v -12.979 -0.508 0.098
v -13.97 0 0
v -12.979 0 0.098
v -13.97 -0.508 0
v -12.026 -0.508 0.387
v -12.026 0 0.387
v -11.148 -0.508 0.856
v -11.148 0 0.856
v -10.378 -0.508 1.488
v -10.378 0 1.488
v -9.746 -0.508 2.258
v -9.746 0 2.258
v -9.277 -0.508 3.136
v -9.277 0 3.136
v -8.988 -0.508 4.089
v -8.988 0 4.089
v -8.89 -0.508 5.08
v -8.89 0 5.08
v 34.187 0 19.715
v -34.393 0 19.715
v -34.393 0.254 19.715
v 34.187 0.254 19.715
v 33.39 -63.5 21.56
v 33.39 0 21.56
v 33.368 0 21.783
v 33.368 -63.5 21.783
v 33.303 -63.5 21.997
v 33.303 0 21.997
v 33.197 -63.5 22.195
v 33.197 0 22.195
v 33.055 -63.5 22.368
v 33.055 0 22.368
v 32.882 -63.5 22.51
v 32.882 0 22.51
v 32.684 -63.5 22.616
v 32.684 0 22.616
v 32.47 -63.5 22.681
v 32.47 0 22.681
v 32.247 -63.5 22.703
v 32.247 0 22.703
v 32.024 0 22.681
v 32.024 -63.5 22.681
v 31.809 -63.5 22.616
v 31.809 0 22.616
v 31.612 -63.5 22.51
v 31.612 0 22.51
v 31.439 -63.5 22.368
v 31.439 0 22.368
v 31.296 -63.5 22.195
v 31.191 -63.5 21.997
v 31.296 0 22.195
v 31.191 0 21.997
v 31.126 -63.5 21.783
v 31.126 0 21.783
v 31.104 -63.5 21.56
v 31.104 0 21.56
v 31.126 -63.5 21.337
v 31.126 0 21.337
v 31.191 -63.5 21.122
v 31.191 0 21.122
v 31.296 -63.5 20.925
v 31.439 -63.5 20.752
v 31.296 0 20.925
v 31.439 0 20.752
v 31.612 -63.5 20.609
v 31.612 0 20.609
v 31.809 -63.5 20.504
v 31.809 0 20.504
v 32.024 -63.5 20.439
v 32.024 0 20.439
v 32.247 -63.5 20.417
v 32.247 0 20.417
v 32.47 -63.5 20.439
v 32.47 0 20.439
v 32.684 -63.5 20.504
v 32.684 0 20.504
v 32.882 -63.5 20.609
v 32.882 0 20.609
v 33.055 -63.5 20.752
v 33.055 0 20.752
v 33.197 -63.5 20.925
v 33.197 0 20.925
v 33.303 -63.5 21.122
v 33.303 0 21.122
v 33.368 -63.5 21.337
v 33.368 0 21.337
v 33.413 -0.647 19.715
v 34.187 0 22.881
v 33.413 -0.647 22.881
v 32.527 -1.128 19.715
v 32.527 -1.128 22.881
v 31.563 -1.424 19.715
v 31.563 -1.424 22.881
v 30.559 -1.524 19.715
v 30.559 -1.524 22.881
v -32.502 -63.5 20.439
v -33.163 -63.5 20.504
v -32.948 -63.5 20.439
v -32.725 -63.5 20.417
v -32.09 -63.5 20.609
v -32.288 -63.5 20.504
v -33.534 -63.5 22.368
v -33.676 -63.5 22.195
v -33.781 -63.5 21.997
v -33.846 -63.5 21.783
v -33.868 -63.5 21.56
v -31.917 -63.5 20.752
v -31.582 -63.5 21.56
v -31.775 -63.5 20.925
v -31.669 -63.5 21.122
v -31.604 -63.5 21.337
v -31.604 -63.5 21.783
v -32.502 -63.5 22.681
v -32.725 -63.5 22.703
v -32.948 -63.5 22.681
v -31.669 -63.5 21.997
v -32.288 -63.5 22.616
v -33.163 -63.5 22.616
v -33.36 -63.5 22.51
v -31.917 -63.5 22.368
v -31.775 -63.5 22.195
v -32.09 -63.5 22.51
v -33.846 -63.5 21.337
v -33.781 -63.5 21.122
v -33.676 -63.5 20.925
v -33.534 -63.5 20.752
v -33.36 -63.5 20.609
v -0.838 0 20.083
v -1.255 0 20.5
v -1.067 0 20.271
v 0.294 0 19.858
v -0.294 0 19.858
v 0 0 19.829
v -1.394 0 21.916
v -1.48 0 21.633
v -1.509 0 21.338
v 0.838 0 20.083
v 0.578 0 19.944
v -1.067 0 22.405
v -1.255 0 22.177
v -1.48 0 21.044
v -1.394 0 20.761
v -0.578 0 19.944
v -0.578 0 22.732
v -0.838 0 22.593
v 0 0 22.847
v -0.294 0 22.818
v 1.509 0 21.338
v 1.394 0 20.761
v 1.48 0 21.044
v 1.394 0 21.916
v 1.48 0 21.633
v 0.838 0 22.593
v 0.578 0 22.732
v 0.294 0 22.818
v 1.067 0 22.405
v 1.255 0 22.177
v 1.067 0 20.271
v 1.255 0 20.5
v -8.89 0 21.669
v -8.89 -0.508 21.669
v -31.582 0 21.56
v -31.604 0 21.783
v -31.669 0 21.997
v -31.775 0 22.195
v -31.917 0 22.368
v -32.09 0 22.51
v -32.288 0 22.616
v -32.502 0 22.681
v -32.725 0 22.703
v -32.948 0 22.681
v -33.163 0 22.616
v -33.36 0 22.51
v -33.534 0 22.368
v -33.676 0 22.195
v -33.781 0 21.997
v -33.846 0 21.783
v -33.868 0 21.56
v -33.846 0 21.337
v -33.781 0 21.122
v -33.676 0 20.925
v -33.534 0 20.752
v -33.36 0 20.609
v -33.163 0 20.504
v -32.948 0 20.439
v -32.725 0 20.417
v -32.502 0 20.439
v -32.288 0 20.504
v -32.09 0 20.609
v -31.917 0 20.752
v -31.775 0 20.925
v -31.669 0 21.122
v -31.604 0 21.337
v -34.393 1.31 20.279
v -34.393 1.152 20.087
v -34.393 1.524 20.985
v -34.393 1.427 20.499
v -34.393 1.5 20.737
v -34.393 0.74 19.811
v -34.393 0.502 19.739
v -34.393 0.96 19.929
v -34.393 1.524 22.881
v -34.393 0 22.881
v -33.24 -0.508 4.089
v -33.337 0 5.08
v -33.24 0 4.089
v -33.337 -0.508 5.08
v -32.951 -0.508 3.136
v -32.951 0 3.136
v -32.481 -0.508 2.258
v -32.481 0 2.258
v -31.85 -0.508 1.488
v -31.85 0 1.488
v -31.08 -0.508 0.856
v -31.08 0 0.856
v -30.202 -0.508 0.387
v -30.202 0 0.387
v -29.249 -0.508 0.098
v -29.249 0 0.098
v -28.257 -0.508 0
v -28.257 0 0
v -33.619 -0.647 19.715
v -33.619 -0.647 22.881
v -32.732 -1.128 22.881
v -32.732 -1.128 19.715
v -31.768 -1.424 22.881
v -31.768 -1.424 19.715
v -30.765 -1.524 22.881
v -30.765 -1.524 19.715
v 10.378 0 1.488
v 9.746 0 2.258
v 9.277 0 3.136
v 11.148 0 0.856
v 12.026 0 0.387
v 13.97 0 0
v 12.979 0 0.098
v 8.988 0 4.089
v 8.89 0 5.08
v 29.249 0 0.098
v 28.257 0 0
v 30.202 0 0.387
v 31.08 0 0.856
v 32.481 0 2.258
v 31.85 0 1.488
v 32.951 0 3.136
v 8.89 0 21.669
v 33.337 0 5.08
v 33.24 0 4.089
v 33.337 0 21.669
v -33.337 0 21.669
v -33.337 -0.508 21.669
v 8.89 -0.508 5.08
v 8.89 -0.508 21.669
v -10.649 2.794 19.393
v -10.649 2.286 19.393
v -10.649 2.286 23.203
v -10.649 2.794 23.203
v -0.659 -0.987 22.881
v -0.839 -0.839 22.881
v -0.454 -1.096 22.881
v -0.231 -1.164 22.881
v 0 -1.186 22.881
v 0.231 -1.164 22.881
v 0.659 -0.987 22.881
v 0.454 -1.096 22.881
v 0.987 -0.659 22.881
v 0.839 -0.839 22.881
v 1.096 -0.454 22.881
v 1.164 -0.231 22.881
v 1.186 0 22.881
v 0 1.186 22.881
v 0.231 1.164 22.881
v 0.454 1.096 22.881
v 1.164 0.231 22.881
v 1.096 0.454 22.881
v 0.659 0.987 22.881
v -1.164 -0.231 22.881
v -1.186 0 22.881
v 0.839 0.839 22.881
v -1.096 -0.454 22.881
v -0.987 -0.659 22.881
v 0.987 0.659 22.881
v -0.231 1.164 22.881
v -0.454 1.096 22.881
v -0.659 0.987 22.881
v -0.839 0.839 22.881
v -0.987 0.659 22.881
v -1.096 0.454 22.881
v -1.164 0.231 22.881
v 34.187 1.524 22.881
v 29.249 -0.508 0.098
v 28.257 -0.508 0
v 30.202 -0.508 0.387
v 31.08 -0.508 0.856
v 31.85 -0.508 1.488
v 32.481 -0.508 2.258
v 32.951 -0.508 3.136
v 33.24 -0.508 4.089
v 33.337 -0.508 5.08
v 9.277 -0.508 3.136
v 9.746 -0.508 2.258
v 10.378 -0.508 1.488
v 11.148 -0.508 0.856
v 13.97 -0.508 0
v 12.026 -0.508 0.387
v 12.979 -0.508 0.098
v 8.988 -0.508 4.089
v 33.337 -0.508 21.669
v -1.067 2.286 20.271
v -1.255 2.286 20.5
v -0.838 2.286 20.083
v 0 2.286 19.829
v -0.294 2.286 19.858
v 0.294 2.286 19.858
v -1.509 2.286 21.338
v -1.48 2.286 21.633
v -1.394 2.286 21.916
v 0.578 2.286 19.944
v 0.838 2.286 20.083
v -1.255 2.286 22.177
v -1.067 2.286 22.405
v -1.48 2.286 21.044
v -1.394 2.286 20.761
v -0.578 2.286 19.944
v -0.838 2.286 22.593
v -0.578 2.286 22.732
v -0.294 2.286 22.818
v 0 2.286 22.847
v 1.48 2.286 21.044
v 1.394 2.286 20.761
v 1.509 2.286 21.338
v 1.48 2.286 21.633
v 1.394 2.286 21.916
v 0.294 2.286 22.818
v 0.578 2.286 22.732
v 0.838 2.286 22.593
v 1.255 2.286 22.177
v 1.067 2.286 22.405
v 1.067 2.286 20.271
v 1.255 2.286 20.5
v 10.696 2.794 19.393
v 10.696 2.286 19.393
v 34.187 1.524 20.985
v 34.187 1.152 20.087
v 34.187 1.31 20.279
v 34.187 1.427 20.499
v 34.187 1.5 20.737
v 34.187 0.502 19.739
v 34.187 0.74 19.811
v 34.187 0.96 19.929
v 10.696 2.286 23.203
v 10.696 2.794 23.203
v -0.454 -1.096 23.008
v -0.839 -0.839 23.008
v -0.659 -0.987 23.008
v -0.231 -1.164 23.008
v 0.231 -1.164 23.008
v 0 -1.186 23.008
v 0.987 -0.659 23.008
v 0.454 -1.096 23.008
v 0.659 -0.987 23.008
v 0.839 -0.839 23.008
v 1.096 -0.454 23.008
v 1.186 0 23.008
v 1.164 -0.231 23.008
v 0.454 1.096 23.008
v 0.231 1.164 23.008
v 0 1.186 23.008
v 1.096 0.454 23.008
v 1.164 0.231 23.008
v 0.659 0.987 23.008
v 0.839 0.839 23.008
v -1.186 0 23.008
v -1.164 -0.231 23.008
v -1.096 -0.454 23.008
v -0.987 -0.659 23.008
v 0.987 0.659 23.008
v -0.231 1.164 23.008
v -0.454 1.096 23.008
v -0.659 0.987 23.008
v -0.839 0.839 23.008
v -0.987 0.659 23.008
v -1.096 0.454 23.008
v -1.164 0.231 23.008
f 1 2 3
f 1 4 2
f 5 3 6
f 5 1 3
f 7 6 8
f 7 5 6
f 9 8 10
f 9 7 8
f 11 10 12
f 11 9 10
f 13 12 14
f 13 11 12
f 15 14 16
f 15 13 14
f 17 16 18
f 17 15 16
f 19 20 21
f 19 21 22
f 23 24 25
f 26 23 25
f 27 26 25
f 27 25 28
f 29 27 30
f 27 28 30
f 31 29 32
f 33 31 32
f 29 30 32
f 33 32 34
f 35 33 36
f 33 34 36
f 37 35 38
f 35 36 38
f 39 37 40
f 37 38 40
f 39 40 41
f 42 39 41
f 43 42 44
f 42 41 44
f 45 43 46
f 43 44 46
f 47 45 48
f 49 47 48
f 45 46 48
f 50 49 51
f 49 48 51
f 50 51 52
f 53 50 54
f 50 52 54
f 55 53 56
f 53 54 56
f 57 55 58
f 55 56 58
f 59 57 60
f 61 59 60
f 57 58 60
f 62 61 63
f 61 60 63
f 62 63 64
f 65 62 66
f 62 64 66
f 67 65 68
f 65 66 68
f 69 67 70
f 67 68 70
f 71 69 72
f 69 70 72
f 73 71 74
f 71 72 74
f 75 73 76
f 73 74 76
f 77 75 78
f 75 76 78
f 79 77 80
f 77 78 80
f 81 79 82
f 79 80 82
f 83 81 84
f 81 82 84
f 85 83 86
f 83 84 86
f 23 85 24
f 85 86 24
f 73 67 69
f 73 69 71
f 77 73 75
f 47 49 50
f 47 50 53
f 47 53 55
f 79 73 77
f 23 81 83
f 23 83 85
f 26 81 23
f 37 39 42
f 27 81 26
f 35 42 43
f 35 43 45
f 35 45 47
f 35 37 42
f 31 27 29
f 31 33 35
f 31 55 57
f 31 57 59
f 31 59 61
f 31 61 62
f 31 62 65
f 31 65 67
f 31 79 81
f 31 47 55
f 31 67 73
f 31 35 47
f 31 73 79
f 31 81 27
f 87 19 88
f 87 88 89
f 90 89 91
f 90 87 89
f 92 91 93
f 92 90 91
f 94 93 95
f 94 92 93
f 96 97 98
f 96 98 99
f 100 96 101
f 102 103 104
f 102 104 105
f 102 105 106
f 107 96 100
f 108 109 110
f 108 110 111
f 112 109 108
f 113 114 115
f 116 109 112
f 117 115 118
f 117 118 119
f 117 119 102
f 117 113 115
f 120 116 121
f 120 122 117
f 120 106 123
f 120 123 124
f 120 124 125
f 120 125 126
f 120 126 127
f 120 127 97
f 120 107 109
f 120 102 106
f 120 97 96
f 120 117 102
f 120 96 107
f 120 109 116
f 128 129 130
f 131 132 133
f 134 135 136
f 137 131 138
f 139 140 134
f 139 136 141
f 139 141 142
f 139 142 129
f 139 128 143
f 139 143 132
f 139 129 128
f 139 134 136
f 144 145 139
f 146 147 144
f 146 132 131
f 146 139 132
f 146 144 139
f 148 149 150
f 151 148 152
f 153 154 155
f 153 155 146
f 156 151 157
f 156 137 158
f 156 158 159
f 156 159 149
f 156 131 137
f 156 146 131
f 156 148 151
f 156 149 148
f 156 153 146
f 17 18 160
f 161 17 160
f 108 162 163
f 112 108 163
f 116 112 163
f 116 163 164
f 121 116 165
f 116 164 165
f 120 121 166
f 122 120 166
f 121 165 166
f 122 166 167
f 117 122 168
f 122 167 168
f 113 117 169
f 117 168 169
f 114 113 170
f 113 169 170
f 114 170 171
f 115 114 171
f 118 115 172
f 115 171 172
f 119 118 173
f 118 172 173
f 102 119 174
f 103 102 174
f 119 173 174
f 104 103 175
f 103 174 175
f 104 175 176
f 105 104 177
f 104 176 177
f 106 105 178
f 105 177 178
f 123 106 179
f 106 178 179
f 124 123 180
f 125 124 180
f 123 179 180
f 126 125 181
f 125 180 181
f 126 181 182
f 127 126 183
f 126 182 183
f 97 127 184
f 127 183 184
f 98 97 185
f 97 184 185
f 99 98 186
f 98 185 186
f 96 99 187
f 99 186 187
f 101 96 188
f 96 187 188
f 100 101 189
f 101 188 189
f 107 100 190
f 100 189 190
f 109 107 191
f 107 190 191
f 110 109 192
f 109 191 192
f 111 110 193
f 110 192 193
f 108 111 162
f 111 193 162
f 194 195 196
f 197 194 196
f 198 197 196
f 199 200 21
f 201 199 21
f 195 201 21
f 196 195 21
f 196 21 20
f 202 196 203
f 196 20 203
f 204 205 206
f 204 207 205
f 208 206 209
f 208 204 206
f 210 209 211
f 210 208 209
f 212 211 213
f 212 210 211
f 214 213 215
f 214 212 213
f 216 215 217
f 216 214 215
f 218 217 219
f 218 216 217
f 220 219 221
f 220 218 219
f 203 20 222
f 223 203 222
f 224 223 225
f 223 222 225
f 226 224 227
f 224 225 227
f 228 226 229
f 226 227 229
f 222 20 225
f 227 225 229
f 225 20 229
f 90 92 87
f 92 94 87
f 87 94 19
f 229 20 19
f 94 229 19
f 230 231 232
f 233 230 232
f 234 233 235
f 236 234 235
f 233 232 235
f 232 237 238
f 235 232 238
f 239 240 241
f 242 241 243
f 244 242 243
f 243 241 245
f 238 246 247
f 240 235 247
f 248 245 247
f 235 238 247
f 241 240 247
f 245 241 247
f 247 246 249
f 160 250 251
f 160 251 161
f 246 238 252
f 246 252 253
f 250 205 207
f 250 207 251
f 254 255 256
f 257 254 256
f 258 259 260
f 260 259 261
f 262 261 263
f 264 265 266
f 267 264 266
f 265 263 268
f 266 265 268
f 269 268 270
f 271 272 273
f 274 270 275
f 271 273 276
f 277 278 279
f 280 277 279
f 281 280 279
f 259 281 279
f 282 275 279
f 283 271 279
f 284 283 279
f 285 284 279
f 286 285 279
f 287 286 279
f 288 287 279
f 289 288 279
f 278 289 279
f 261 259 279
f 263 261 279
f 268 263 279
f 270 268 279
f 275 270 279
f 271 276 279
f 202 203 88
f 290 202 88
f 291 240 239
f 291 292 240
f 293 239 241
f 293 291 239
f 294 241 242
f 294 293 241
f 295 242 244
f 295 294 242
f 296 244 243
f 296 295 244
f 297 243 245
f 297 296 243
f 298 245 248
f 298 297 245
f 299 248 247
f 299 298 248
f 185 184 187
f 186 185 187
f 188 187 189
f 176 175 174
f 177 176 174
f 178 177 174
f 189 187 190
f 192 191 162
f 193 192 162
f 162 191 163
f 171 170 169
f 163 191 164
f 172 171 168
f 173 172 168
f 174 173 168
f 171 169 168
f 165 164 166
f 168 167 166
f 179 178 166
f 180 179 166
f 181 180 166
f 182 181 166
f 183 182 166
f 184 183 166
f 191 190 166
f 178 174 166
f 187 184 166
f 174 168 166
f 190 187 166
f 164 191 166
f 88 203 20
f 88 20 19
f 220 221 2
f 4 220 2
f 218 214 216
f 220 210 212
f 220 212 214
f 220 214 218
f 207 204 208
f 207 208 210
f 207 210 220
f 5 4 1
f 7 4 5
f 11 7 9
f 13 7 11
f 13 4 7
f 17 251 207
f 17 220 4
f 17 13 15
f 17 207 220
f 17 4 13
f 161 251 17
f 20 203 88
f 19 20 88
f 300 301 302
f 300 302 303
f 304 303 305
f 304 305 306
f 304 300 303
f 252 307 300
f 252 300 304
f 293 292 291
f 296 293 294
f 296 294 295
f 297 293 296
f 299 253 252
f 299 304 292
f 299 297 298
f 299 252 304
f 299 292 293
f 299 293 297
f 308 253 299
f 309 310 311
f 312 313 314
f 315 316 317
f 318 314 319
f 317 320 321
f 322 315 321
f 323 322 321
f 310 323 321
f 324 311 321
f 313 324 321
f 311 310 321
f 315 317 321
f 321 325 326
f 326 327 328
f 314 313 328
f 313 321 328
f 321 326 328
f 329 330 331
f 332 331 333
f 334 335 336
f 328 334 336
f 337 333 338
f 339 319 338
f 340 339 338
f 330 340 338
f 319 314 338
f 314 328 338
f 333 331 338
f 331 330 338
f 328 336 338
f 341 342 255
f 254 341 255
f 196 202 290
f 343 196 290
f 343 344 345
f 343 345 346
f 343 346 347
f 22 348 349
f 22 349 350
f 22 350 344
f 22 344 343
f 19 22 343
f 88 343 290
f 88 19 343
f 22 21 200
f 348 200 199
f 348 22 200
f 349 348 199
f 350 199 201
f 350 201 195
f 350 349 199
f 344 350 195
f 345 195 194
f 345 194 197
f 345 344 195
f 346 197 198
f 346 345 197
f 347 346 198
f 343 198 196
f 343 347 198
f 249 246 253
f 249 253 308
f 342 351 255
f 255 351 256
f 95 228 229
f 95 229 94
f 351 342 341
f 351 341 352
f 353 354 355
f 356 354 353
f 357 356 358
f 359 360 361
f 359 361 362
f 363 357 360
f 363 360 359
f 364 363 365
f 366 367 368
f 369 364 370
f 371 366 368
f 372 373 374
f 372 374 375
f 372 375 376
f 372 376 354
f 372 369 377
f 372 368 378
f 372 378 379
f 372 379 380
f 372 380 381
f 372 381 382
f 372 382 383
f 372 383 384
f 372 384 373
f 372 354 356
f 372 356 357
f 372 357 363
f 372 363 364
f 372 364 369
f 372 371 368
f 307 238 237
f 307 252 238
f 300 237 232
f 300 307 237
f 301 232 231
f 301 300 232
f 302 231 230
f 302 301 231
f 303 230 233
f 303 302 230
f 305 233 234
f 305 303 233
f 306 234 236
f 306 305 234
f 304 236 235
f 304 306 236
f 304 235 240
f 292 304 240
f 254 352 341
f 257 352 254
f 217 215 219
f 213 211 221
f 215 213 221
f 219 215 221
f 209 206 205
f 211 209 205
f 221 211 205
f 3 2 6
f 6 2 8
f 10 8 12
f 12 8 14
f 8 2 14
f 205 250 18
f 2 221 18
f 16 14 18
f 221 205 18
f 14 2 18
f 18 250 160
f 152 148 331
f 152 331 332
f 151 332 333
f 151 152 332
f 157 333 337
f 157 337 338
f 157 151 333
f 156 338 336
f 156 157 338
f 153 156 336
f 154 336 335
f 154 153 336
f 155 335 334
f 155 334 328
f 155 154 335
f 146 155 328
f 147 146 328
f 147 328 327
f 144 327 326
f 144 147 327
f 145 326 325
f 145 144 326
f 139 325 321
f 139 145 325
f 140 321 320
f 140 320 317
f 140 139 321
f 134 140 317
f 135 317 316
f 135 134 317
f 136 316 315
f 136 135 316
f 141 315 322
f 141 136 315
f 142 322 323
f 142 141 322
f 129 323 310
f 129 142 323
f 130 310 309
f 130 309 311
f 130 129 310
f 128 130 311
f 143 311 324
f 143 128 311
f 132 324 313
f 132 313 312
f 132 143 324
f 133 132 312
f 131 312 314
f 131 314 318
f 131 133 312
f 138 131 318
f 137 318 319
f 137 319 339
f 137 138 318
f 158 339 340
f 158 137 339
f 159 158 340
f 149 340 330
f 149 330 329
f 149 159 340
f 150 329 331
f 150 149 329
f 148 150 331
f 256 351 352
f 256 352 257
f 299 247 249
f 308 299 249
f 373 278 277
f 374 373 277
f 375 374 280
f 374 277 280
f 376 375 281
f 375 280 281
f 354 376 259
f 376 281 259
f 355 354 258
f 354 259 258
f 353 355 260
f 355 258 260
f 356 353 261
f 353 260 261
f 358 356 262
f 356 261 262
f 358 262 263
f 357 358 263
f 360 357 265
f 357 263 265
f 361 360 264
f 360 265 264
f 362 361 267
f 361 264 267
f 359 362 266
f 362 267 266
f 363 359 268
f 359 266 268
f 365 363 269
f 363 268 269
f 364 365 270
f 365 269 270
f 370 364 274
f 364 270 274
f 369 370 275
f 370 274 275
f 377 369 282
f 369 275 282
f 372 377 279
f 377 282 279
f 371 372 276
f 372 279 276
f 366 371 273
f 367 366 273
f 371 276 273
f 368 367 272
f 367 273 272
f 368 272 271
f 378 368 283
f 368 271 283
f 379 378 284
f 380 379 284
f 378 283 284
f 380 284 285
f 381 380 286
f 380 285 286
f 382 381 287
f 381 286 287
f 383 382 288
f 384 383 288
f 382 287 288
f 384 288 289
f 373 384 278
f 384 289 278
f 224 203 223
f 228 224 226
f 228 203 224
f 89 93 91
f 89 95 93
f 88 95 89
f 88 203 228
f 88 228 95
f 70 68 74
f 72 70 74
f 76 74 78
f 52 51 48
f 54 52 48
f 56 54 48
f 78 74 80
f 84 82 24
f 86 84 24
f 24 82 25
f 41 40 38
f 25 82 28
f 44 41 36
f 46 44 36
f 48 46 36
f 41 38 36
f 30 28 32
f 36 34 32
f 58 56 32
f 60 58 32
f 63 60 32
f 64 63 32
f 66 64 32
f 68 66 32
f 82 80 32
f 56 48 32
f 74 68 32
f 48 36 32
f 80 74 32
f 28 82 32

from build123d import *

# Parameters (mm, degrees)
F0_W        = 24.4474970783
F0_H        = 21.6693738201
F1_DEPTH    = 0.508
F2_W        = 68.58
F2_H        = 3.1658634543
F3_DEPTH    = 1.524
F4_DEPTH    = 1.524
F5_R        = 5.08
F5_2_R      = 5.08
F6_R        = 1.143
F7_DEPTH    = 63.5
F8_R        = 1.27
F9_T1_DEPTH = 21.3050916628
F10_R       = 1.5092579777
F11_DEPTH   = 2.286
F12_W       = 21.3444312233
F12_H       = 3.81
F12_R       = 1.5092579777
F13_DEPTH   = 0.508
F15_DEPTH   = 0.127


# Not quite as in the source:
# - a fillet or chamfer that OpenCascade refuses, or shapes differently, is made with other operations: its cross-section is extruded or revolved along the edge and cut away or added


with BuildPart() as f1:
    # F0 (on Front) → F1 (new body)
    with BuildSketch(Plane.XZ):
        with Locations((-21.1137485391, 10.83468691)):
            Rectangle(F0_W, F0_H)
    extrude(amount=F1_DEPTH)

    # F5
    f5_edges = [f1.edges().sort_by_distance(p)[0] for p in [
        (-8.89, -0.254, 0),
        (-33.337497, -0.254, 0),
    ]]
    fillet(f5_edges, radius=F5_R)


with BuildPart() as f1b:
    # F0 (on Front) → F1, piece 2 (new body)
    with BuildSketch(Plane.XZ):
        with Locations((21.1137485391, 10.83468691)):
            Rectangle(F0_W, F0_H)
    extrude(amount=F1_DEPTH)

    # F5#2
    f5_2_edges = [f1b.edges().sort_by_distance(p)[0] for p in [
        (8.89, -0.254, 0),
        (33.337497, -0.254, 0),
    ]]
    fillet(f5_2_edges, radius=F5_2_R)


with BuildPart() as f3:
    # F2 (on Front) → F3 (new body)
    with BuildSketch(Plane.XZ):
        with Locations((-0.1027890062, 21.2976261973)):
            Rectangle(F2_W, F2_H)
    extrude(amount=F3_DEPTH)


with BuildPart() as f4:
    # F4 (new): a face of the model
    f4_faces = [f3.part.faces().sort_by_distance(p)[0] for p in [
        (-0.1027890062, 0, 21.2976261973),
    ]]
    extrude(f4_faces, amount=F4_DEPTH)

    # F8
    f8_edges = [f4.edges().sort_by_distance(p)[0] for p in [
        (-0.102789, 1.524, 19.714694),
    ]]
    fillet(f8_edges, radius=F8_R)


with BuildPart() as f7:
    # F6 (on Front) → F7 (new body)
    with BuildSketch(Plane.XZ):
        with Locations((32.2467535734, 21.5597579245)):
            Circle(F6_R)
    extrude(amount=F7_DEPTH)


with BuildPart() as f7b:
    # F6 (on Front) → F7, piece 2 (new body)
    with BuildSketch(Plane.XZ):
        with Locations((-32.7254012227, 21.5597579245)):
            Circle(F6_R)
    extrude(amount=F7_DEPTH)


with BuildPart() as f3_1:
    add(f3.part)

    # F9: fillet of radius 5.08 on 2 edges, made by hand

    # F9_s2 → F9_t1 (cut)
    with BuildSketch(Plane.XY.offset(10.6450803659)):
        with BuildLine():
            ThreePointArc((34.1872109938, 0), (32.5268408919, -1.1275285843), (30.5593653521, -1.524))
            Line((30.5593653521, -1.524), (34.1872109938, -1.524))
            Line((34.1872109938, -1.524), (34.1872109938, 0))
        make_face()
        with BuildLine():
            ThreePointArc((-34.3927890062, 0), (-32.7324189044, -1.1275285843), (-30.7649433645, -1.524))
            Line((-30.7649433645, -1.524), (-34.3927890062, -1.524))
            Line((-34.3927890062, -1.524), (-34.3927890062, 0))
        make_face()
    extrude(amount=F9_T1_DEPTH, mode=Mode.SUBTRACT)


with BuildPart() as f11:
    # F10 (on Front) → F11 (new body)
    with BuildSketch(Plane.XZ):
        with Locations((0, 21.3380698115)):
            Circle(F10_R)
    extrude(amount=-F11_DEPTH)


with BuildPart() as f13:
    # F12 (on face) → F13 (new body)
    with BuildSketch(Plane(origin=(0, 2.286, 0), x_dir=(-1, 0, 0), z_dir=(0, 1, 0))):
        with Locations((-0.0235047191, 21.2976261973)):
            Rectangle(F12_W, F12_H)
        with Locations((0, 21.3380698115)):
            Circle(F12_R, mode=Mode.SUBTRACT)
        with Locations((0, 21.3380698115)):
            Circle(F12_R)
    extrude(amount=F13_DEPTH)


with BuildPart() as f15:
    # F14 (on face) → F15 (new body)
    with BuildSketch(Plane.XY.offset(22.8805579245)):
        with BuildLine():
            Line((-1.1864949831, 0), (1.1864949831, 0))
            ThreePointArc((1.1864949831, 0), (0, 1.1864949831), (-1.1864949831, 0))
        make_face()
        with BuildLine():
            ThreePointArc((-1.1864949831, 0), (0, -1.1864949831), (1.1864949831, 0))
            Line((1.1864949831, 0), (-1.1864949831, 0))
        make_face()
    extrude(amount=F15_DEPTH)


solid = Compound([f1.part, f1b.part, f4.part, f7.part, f7b.part, f3_1.part, f11.part, f13.part, f15.part])
